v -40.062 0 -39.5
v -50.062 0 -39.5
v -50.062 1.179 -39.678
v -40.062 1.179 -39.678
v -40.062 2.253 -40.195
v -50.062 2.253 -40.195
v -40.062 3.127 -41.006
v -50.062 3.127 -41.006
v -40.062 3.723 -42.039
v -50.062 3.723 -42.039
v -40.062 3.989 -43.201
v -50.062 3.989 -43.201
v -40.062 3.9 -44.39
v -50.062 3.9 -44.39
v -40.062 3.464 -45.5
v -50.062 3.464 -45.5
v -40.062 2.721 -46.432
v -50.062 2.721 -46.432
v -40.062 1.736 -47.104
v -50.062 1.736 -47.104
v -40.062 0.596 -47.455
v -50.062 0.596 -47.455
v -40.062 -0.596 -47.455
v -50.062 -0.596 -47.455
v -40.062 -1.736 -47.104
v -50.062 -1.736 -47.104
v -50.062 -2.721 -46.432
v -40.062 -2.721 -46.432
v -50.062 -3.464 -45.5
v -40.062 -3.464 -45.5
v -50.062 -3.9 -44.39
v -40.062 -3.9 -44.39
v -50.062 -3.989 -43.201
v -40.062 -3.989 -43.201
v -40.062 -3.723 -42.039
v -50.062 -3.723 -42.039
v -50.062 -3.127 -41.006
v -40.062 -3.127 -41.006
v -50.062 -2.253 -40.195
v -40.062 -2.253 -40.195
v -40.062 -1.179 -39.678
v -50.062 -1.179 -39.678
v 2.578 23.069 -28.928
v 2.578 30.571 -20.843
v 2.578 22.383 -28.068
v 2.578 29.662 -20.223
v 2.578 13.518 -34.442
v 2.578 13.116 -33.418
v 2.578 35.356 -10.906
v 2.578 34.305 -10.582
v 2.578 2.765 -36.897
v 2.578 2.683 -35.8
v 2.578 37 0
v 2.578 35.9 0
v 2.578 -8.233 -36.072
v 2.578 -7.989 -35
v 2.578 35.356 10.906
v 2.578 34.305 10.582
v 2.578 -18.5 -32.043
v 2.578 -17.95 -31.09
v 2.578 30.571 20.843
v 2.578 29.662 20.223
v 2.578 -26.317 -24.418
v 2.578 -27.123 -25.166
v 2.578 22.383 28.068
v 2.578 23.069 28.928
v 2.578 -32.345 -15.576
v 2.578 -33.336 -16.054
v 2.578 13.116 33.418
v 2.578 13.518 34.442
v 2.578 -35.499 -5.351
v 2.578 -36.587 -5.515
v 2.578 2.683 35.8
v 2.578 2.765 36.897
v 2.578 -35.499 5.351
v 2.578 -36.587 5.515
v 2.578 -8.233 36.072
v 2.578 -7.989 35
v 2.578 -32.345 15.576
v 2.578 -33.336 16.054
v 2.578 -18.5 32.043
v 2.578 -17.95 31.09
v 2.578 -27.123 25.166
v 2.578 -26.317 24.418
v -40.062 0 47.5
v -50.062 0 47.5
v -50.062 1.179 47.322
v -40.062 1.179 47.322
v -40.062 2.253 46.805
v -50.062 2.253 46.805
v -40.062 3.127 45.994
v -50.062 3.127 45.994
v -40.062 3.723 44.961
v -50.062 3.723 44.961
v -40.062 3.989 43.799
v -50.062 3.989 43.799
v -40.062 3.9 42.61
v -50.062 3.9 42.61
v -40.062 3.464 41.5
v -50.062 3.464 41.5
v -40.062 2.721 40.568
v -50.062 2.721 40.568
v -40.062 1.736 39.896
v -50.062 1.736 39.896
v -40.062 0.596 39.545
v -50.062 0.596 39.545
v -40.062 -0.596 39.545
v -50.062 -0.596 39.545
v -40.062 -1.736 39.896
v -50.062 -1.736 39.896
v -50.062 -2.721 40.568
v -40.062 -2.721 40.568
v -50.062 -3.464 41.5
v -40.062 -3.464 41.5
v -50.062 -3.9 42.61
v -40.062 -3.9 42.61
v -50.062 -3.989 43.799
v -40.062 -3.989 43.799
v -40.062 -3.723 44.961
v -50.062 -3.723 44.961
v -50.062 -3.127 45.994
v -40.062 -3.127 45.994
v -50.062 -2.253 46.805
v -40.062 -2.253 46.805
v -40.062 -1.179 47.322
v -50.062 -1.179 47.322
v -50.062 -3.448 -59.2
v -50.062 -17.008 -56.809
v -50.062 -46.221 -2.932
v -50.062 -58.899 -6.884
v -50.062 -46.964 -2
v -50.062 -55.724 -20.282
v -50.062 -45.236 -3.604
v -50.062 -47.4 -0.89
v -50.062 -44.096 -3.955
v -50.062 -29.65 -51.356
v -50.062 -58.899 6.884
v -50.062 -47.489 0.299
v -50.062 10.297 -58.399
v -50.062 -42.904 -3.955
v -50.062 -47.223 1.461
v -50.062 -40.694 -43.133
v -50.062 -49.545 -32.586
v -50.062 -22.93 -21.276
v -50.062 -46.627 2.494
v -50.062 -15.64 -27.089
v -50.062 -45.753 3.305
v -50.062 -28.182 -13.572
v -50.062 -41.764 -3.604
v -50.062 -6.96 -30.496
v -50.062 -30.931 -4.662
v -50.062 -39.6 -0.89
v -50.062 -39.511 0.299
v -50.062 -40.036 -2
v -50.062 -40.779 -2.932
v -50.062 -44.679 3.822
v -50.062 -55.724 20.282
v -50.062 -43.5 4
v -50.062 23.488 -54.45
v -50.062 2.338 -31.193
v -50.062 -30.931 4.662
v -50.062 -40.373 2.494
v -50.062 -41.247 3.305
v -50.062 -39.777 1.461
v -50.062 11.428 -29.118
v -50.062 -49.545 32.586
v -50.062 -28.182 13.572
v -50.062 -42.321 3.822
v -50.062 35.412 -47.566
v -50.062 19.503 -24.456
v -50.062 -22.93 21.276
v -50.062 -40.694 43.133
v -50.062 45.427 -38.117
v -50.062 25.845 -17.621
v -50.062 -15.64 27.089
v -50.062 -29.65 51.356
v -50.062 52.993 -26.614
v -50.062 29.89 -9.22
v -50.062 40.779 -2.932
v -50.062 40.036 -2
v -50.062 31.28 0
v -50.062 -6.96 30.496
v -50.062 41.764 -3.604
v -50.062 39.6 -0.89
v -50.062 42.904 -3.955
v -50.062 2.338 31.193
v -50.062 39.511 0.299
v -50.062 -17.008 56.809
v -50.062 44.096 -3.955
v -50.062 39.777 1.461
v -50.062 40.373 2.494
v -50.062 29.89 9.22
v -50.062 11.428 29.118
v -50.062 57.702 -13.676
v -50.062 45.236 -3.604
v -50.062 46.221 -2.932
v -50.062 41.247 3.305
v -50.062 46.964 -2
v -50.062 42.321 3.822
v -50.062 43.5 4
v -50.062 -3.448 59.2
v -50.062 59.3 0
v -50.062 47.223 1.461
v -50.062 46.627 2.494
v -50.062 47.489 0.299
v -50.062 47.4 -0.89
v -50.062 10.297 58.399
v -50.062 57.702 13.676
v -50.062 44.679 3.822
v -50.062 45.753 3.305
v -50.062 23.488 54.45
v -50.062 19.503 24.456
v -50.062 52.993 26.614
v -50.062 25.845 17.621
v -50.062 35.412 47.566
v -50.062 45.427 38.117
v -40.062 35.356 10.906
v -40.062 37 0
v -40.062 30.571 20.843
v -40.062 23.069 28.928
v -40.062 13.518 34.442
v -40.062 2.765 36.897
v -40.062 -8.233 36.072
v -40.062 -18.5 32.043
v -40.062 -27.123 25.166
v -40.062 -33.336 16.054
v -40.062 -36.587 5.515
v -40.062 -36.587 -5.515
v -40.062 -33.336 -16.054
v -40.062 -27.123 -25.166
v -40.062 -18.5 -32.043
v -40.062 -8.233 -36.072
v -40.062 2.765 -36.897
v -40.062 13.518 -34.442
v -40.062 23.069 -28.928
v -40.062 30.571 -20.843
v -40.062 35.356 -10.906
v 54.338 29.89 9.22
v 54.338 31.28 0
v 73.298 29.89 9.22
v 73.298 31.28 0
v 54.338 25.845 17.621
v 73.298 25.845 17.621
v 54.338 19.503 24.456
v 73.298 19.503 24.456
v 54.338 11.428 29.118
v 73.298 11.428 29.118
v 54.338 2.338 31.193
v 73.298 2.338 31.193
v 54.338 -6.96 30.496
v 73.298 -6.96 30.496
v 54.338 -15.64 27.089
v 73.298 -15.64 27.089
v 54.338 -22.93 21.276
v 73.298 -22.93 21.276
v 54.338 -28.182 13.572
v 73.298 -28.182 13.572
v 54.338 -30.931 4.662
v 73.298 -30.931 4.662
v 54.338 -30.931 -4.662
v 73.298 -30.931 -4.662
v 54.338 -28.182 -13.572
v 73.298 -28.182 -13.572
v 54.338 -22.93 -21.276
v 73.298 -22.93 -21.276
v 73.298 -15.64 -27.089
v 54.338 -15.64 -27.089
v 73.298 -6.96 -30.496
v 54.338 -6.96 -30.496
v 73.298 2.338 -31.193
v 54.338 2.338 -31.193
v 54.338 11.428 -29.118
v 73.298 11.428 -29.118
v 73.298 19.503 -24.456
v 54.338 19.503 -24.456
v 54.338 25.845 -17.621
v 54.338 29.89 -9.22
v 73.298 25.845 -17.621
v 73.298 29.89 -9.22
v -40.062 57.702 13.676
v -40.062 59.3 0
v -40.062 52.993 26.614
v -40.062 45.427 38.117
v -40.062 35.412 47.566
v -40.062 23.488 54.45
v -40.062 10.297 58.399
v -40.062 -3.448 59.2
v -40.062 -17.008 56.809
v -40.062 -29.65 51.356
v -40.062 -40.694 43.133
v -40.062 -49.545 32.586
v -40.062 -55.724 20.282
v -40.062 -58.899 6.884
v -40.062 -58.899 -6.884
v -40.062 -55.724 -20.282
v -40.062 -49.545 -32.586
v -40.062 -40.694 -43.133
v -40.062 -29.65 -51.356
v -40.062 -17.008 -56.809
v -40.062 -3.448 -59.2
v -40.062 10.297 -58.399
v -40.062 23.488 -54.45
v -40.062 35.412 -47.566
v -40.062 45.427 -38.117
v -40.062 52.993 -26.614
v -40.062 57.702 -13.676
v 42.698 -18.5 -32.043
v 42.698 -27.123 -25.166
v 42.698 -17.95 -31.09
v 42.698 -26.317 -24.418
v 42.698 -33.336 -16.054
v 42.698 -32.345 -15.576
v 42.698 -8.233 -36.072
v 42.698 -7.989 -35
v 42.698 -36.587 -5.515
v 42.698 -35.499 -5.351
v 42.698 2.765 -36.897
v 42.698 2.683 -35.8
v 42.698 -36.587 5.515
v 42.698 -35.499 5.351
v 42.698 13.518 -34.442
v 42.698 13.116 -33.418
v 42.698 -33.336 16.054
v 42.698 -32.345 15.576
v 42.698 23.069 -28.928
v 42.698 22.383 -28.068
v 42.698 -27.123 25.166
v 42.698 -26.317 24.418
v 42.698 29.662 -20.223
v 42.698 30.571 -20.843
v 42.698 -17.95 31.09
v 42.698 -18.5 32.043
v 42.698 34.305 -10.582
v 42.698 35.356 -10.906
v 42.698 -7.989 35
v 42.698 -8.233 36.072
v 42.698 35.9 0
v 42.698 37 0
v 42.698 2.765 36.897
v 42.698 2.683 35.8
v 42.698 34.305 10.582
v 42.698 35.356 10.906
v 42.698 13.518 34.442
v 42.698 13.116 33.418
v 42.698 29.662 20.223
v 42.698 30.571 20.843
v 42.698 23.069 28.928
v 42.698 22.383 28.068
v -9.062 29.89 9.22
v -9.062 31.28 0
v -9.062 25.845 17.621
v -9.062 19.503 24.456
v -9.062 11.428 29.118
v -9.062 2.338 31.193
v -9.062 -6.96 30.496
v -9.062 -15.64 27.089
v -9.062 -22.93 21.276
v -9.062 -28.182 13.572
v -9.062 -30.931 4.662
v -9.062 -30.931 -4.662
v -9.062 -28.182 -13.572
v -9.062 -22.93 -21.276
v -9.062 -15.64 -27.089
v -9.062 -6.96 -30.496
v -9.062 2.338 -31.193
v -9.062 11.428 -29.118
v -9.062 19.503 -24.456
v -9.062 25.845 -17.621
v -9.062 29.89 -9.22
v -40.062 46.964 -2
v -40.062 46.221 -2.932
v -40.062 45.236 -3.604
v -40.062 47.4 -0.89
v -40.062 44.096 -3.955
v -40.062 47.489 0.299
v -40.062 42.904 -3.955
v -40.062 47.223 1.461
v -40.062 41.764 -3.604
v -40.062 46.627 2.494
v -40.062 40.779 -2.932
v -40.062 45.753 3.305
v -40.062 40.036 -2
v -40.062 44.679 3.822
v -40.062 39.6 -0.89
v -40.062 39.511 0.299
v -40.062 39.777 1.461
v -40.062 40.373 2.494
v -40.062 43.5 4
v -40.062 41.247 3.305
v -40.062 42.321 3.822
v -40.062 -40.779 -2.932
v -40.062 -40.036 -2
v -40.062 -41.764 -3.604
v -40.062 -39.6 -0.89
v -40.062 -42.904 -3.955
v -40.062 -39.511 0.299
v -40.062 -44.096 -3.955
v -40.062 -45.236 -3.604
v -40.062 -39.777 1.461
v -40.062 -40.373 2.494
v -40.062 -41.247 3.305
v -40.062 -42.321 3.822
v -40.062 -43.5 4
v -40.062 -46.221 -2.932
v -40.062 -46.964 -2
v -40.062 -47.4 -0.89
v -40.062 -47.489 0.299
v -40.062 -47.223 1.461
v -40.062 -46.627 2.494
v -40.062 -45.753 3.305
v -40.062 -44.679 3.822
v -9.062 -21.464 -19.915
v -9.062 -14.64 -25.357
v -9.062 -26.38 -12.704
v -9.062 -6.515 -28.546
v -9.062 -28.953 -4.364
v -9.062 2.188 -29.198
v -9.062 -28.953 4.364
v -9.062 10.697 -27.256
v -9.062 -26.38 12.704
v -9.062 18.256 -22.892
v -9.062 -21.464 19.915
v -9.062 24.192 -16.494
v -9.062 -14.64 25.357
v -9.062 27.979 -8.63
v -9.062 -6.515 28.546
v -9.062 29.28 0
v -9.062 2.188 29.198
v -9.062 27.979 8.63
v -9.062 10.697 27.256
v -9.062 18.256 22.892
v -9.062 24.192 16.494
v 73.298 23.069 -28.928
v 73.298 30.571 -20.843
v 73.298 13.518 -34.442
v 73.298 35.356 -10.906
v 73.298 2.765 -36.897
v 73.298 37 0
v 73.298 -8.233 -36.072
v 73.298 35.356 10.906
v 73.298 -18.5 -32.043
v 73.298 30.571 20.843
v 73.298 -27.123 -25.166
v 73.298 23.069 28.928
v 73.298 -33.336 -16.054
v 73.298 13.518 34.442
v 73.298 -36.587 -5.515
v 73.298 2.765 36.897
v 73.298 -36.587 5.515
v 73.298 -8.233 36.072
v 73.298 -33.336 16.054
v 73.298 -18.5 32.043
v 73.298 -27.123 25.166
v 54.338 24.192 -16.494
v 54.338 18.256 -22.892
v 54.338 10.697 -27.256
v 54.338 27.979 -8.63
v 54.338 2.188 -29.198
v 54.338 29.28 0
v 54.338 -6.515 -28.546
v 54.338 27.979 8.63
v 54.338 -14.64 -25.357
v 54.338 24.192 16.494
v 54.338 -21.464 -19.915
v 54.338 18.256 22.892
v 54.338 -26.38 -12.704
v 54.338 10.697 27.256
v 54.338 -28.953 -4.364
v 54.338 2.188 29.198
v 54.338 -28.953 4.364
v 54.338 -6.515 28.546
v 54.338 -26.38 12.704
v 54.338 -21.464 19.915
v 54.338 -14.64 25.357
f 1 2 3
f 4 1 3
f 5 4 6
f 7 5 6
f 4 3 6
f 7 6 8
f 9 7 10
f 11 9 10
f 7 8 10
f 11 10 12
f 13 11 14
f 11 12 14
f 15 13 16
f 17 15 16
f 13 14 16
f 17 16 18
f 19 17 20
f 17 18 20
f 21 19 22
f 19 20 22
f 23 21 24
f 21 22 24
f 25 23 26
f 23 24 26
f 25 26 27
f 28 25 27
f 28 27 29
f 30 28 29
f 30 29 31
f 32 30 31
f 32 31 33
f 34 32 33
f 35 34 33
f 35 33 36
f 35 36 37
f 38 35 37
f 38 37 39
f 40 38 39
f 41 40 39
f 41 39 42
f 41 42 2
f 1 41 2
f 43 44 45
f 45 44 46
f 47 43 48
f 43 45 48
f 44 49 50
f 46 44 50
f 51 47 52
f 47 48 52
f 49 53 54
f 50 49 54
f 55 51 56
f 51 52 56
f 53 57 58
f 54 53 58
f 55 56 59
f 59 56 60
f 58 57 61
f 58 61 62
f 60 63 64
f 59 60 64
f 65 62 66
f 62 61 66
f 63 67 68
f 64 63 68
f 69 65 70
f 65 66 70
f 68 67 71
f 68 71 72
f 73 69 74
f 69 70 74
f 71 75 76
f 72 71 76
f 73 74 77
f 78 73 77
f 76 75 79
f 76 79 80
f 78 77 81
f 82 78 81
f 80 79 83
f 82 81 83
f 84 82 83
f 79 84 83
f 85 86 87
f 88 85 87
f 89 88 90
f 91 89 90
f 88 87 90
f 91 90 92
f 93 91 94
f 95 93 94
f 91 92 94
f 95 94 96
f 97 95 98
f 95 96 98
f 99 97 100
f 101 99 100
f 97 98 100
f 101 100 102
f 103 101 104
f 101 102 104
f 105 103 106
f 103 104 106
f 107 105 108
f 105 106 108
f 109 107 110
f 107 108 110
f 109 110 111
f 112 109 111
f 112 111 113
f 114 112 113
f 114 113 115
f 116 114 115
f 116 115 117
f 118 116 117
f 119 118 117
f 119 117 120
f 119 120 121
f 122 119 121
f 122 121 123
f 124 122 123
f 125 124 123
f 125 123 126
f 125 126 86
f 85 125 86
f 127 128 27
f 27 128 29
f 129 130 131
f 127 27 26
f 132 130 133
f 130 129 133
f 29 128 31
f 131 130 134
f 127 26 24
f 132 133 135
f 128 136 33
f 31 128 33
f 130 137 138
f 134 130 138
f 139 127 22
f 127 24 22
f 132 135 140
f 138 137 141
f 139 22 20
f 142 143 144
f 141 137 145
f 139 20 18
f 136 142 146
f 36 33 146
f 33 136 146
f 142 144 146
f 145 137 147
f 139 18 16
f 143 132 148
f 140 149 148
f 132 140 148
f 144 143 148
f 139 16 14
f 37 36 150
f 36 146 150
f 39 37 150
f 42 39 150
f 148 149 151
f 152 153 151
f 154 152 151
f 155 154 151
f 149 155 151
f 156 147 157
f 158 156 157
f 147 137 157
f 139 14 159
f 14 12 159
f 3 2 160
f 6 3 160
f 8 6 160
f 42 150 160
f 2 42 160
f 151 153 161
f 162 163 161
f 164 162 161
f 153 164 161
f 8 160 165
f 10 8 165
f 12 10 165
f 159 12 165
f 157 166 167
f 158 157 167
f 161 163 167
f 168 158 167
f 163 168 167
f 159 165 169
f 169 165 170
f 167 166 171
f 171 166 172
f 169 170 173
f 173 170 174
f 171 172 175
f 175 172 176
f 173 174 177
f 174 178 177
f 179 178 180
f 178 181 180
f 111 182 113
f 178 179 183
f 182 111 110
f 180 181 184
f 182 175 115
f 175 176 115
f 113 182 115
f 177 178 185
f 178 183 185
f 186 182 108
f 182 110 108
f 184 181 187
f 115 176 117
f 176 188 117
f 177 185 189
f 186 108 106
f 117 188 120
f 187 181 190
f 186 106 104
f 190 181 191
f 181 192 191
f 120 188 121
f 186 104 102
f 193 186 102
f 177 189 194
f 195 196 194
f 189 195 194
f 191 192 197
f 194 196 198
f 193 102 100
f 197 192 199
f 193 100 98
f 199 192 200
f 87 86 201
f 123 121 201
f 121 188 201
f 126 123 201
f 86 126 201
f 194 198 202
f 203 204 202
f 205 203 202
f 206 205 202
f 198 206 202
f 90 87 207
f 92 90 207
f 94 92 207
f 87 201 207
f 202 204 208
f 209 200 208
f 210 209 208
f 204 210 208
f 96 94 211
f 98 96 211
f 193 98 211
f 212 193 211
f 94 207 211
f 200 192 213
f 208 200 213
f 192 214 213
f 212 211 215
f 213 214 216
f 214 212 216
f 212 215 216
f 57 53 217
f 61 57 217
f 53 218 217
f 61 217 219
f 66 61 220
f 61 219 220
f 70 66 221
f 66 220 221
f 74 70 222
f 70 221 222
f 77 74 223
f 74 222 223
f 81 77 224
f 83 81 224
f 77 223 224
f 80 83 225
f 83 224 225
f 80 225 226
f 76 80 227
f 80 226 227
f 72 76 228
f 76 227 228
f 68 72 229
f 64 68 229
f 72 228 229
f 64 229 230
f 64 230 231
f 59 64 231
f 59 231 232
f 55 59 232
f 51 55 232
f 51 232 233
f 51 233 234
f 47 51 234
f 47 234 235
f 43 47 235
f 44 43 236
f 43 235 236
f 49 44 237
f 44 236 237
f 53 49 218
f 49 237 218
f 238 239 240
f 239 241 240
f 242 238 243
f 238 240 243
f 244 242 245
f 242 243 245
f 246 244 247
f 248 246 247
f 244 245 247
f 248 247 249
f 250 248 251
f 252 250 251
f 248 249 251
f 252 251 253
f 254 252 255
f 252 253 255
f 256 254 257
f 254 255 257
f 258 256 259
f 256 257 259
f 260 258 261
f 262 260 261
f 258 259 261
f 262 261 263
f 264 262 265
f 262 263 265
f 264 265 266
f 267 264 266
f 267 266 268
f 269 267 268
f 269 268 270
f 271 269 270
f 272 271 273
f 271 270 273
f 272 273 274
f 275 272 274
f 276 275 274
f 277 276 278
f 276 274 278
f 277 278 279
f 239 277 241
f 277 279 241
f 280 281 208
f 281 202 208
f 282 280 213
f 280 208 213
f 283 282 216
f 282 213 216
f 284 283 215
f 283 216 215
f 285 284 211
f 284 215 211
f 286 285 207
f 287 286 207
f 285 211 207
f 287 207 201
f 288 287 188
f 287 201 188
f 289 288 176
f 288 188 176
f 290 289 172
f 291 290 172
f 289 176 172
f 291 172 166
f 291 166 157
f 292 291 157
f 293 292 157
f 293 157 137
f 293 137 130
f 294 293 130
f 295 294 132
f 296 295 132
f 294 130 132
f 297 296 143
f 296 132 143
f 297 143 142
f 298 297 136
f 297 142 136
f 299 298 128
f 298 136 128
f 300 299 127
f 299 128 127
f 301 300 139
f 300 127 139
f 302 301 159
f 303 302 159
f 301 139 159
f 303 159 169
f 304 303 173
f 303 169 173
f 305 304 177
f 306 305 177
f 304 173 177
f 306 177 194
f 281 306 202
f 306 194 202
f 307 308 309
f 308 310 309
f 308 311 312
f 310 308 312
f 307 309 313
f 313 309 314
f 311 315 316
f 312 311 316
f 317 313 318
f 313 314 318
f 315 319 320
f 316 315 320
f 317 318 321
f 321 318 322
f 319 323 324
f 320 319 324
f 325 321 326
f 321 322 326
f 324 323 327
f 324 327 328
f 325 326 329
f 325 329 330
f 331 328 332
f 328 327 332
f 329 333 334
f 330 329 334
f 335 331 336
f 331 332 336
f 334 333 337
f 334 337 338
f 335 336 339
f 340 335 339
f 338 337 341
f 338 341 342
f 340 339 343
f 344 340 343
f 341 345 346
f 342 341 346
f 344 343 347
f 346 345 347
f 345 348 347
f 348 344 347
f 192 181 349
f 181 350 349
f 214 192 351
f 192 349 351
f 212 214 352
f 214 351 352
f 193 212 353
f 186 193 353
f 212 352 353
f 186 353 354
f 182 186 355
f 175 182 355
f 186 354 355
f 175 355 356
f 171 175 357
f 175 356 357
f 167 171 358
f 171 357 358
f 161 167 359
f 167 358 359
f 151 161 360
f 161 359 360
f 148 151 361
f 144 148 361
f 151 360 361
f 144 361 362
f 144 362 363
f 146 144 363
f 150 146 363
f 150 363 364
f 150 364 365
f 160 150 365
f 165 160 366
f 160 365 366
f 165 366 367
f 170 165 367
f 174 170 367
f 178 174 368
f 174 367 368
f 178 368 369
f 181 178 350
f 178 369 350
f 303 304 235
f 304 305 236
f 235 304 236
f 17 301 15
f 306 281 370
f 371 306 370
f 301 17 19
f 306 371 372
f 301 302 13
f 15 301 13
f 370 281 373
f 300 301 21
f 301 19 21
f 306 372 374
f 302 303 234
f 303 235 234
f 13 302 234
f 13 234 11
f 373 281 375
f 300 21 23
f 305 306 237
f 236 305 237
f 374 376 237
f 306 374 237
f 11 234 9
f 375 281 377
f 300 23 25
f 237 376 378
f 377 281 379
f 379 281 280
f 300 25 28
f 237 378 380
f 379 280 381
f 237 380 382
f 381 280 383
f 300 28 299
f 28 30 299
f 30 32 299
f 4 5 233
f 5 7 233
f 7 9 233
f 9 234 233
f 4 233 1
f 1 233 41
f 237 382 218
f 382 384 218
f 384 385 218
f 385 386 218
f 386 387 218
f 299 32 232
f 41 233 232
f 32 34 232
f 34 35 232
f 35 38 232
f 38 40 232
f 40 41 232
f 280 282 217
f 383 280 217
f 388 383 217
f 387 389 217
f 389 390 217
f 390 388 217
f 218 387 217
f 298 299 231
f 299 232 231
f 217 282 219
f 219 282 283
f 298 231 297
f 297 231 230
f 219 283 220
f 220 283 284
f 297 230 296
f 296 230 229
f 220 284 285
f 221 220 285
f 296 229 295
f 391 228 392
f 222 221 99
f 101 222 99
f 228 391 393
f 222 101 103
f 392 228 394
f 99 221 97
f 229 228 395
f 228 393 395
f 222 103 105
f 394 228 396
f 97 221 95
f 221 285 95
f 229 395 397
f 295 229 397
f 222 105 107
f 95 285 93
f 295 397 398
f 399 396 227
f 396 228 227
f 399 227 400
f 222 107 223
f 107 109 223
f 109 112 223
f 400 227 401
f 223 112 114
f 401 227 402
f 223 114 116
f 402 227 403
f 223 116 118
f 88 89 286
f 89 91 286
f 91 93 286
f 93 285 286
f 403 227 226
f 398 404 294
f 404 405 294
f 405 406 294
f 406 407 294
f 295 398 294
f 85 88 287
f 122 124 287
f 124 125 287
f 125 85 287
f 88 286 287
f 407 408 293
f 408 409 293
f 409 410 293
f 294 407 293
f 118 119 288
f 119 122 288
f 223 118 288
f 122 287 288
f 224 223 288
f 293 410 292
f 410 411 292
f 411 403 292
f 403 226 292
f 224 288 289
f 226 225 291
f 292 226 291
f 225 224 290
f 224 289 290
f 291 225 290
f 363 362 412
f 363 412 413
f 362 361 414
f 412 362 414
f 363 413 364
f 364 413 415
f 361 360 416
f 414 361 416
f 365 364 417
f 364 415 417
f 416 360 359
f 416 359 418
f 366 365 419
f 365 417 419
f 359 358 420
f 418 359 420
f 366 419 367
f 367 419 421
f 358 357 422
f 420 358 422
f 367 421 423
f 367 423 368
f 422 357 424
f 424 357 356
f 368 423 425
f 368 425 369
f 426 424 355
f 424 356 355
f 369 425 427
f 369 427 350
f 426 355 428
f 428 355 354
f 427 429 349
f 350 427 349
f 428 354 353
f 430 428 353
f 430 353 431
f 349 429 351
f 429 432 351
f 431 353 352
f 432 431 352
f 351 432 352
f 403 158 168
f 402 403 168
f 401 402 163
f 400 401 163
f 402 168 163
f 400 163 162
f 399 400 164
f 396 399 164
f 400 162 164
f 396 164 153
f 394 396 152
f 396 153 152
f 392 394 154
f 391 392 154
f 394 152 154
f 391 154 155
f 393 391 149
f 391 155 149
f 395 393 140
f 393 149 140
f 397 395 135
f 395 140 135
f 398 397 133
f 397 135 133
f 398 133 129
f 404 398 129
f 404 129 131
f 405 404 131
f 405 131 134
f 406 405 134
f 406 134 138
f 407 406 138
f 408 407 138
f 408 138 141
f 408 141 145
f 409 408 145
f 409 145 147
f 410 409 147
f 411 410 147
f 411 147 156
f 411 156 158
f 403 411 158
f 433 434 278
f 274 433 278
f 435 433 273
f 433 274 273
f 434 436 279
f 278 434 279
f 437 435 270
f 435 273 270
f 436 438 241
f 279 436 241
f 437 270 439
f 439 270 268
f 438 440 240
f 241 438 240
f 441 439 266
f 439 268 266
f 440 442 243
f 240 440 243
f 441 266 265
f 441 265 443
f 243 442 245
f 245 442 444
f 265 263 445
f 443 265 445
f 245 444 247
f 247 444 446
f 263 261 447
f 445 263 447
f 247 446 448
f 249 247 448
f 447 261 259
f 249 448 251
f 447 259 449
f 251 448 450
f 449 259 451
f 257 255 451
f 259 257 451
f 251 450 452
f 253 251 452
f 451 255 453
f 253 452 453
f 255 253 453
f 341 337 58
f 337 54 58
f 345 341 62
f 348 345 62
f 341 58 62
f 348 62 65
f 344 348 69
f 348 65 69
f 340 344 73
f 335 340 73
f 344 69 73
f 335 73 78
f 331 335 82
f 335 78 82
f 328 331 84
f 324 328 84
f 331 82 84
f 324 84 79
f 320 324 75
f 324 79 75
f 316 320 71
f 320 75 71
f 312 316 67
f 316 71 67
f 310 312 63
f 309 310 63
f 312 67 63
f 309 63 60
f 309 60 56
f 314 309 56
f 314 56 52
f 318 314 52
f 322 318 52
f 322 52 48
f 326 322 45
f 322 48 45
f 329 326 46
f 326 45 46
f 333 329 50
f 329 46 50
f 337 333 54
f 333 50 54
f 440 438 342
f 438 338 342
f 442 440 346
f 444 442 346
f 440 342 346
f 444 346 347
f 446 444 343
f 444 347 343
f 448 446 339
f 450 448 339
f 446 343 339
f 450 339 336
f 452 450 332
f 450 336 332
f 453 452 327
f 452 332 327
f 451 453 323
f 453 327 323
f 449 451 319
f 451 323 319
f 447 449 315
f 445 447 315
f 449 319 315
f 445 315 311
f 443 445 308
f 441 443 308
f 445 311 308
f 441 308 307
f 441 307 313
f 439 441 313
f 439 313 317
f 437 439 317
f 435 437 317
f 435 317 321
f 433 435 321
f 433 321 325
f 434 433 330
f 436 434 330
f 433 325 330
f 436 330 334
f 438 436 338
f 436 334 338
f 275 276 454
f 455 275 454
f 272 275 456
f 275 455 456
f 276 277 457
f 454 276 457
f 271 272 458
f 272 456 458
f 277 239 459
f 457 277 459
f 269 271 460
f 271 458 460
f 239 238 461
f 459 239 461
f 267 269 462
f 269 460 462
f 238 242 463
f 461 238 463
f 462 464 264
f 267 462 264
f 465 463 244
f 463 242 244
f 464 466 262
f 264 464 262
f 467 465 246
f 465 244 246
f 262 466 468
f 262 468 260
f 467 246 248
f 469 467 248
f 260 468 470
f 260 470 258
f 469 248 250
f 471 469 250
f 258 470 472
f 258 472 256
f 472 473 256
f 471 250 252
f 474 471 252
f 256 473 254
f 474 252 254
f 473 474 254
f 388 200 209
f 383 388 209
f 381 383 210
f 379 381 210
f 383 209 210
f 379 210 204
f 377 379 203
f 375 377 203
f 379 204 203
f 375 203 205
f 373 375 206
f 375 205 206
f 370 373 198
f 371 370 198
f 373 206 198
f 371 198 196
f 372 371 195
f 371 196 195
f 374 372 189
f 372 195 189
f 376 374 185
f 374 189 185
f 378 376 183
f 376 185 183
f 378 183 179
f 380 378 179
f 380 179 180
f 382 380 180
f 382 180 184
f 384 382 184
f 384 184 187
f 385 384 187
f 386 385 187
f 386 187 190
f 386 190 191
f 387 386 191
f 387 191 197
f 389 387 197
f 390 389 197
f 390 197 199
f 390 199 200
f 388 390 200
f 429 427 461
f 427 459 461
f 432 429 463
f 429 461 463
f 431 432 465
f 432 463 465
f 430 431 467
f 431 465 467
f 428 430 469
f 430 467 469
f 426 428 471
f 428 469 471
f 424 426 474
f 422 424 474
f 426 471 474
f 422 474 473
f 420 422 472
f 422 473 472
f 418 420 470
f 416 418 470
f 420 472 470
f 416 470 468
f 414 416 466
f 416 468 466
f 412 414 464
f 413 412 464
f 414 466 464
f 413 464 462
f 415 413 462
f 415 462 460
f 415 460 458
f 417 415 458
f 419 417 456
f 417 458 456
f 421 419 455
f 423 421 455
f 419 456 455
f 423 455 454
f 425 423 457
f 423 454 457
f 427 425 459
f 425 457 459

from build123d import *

# Parameters (mm, degrees)
SKETCH_2_R          = 4
CUT_EXTRUDE_1_DEPTH = 124.36


with BuildPart() as part:
    # 草图1 → 旋转1 (revolve)
    with BuildSketch(Plane.XY):
        Polygon((73.298050743, 37), (42.698050743, 37), (42.698050743, 35.9), (2.578050743, 35.9), (2.578050743, 37), (-40.061949257, 37), (-40.061949257, 59.300299501), (-50.061949257, 59.300299501), (-50.061949257, 31.28), (-9.061949257, 31.28), (-9.061949257, 29.28), (54.338050743, 29.28), (54.338050743, 31.28), (73.298050743, 31.28), align=None)
    revolve(axis=Axis((-67.043189493, 0, 0), (1, 0, 0)))

    # 草图2 → 切除-拉伸1 (cut, through all)
    with BuildSketch(Plane.ZY.offset(50.061949257)):
        with Locations((0, 43.5)):
            Circle(SKETCH_2_R)
        with Locations((43.5, 0)):
            Circle(SKETCH_2_R)
        with Locations((0, -43.5)):
            Circle(SKETCH_2_R)
        with Locations((-43.5, 0)):
            Circle(SKETCH_2_R)
    extrude(amount=-CUT_EXTRUDE_1_DEPTH, mode=Mode.SUBTRACT)


solid = part.part
